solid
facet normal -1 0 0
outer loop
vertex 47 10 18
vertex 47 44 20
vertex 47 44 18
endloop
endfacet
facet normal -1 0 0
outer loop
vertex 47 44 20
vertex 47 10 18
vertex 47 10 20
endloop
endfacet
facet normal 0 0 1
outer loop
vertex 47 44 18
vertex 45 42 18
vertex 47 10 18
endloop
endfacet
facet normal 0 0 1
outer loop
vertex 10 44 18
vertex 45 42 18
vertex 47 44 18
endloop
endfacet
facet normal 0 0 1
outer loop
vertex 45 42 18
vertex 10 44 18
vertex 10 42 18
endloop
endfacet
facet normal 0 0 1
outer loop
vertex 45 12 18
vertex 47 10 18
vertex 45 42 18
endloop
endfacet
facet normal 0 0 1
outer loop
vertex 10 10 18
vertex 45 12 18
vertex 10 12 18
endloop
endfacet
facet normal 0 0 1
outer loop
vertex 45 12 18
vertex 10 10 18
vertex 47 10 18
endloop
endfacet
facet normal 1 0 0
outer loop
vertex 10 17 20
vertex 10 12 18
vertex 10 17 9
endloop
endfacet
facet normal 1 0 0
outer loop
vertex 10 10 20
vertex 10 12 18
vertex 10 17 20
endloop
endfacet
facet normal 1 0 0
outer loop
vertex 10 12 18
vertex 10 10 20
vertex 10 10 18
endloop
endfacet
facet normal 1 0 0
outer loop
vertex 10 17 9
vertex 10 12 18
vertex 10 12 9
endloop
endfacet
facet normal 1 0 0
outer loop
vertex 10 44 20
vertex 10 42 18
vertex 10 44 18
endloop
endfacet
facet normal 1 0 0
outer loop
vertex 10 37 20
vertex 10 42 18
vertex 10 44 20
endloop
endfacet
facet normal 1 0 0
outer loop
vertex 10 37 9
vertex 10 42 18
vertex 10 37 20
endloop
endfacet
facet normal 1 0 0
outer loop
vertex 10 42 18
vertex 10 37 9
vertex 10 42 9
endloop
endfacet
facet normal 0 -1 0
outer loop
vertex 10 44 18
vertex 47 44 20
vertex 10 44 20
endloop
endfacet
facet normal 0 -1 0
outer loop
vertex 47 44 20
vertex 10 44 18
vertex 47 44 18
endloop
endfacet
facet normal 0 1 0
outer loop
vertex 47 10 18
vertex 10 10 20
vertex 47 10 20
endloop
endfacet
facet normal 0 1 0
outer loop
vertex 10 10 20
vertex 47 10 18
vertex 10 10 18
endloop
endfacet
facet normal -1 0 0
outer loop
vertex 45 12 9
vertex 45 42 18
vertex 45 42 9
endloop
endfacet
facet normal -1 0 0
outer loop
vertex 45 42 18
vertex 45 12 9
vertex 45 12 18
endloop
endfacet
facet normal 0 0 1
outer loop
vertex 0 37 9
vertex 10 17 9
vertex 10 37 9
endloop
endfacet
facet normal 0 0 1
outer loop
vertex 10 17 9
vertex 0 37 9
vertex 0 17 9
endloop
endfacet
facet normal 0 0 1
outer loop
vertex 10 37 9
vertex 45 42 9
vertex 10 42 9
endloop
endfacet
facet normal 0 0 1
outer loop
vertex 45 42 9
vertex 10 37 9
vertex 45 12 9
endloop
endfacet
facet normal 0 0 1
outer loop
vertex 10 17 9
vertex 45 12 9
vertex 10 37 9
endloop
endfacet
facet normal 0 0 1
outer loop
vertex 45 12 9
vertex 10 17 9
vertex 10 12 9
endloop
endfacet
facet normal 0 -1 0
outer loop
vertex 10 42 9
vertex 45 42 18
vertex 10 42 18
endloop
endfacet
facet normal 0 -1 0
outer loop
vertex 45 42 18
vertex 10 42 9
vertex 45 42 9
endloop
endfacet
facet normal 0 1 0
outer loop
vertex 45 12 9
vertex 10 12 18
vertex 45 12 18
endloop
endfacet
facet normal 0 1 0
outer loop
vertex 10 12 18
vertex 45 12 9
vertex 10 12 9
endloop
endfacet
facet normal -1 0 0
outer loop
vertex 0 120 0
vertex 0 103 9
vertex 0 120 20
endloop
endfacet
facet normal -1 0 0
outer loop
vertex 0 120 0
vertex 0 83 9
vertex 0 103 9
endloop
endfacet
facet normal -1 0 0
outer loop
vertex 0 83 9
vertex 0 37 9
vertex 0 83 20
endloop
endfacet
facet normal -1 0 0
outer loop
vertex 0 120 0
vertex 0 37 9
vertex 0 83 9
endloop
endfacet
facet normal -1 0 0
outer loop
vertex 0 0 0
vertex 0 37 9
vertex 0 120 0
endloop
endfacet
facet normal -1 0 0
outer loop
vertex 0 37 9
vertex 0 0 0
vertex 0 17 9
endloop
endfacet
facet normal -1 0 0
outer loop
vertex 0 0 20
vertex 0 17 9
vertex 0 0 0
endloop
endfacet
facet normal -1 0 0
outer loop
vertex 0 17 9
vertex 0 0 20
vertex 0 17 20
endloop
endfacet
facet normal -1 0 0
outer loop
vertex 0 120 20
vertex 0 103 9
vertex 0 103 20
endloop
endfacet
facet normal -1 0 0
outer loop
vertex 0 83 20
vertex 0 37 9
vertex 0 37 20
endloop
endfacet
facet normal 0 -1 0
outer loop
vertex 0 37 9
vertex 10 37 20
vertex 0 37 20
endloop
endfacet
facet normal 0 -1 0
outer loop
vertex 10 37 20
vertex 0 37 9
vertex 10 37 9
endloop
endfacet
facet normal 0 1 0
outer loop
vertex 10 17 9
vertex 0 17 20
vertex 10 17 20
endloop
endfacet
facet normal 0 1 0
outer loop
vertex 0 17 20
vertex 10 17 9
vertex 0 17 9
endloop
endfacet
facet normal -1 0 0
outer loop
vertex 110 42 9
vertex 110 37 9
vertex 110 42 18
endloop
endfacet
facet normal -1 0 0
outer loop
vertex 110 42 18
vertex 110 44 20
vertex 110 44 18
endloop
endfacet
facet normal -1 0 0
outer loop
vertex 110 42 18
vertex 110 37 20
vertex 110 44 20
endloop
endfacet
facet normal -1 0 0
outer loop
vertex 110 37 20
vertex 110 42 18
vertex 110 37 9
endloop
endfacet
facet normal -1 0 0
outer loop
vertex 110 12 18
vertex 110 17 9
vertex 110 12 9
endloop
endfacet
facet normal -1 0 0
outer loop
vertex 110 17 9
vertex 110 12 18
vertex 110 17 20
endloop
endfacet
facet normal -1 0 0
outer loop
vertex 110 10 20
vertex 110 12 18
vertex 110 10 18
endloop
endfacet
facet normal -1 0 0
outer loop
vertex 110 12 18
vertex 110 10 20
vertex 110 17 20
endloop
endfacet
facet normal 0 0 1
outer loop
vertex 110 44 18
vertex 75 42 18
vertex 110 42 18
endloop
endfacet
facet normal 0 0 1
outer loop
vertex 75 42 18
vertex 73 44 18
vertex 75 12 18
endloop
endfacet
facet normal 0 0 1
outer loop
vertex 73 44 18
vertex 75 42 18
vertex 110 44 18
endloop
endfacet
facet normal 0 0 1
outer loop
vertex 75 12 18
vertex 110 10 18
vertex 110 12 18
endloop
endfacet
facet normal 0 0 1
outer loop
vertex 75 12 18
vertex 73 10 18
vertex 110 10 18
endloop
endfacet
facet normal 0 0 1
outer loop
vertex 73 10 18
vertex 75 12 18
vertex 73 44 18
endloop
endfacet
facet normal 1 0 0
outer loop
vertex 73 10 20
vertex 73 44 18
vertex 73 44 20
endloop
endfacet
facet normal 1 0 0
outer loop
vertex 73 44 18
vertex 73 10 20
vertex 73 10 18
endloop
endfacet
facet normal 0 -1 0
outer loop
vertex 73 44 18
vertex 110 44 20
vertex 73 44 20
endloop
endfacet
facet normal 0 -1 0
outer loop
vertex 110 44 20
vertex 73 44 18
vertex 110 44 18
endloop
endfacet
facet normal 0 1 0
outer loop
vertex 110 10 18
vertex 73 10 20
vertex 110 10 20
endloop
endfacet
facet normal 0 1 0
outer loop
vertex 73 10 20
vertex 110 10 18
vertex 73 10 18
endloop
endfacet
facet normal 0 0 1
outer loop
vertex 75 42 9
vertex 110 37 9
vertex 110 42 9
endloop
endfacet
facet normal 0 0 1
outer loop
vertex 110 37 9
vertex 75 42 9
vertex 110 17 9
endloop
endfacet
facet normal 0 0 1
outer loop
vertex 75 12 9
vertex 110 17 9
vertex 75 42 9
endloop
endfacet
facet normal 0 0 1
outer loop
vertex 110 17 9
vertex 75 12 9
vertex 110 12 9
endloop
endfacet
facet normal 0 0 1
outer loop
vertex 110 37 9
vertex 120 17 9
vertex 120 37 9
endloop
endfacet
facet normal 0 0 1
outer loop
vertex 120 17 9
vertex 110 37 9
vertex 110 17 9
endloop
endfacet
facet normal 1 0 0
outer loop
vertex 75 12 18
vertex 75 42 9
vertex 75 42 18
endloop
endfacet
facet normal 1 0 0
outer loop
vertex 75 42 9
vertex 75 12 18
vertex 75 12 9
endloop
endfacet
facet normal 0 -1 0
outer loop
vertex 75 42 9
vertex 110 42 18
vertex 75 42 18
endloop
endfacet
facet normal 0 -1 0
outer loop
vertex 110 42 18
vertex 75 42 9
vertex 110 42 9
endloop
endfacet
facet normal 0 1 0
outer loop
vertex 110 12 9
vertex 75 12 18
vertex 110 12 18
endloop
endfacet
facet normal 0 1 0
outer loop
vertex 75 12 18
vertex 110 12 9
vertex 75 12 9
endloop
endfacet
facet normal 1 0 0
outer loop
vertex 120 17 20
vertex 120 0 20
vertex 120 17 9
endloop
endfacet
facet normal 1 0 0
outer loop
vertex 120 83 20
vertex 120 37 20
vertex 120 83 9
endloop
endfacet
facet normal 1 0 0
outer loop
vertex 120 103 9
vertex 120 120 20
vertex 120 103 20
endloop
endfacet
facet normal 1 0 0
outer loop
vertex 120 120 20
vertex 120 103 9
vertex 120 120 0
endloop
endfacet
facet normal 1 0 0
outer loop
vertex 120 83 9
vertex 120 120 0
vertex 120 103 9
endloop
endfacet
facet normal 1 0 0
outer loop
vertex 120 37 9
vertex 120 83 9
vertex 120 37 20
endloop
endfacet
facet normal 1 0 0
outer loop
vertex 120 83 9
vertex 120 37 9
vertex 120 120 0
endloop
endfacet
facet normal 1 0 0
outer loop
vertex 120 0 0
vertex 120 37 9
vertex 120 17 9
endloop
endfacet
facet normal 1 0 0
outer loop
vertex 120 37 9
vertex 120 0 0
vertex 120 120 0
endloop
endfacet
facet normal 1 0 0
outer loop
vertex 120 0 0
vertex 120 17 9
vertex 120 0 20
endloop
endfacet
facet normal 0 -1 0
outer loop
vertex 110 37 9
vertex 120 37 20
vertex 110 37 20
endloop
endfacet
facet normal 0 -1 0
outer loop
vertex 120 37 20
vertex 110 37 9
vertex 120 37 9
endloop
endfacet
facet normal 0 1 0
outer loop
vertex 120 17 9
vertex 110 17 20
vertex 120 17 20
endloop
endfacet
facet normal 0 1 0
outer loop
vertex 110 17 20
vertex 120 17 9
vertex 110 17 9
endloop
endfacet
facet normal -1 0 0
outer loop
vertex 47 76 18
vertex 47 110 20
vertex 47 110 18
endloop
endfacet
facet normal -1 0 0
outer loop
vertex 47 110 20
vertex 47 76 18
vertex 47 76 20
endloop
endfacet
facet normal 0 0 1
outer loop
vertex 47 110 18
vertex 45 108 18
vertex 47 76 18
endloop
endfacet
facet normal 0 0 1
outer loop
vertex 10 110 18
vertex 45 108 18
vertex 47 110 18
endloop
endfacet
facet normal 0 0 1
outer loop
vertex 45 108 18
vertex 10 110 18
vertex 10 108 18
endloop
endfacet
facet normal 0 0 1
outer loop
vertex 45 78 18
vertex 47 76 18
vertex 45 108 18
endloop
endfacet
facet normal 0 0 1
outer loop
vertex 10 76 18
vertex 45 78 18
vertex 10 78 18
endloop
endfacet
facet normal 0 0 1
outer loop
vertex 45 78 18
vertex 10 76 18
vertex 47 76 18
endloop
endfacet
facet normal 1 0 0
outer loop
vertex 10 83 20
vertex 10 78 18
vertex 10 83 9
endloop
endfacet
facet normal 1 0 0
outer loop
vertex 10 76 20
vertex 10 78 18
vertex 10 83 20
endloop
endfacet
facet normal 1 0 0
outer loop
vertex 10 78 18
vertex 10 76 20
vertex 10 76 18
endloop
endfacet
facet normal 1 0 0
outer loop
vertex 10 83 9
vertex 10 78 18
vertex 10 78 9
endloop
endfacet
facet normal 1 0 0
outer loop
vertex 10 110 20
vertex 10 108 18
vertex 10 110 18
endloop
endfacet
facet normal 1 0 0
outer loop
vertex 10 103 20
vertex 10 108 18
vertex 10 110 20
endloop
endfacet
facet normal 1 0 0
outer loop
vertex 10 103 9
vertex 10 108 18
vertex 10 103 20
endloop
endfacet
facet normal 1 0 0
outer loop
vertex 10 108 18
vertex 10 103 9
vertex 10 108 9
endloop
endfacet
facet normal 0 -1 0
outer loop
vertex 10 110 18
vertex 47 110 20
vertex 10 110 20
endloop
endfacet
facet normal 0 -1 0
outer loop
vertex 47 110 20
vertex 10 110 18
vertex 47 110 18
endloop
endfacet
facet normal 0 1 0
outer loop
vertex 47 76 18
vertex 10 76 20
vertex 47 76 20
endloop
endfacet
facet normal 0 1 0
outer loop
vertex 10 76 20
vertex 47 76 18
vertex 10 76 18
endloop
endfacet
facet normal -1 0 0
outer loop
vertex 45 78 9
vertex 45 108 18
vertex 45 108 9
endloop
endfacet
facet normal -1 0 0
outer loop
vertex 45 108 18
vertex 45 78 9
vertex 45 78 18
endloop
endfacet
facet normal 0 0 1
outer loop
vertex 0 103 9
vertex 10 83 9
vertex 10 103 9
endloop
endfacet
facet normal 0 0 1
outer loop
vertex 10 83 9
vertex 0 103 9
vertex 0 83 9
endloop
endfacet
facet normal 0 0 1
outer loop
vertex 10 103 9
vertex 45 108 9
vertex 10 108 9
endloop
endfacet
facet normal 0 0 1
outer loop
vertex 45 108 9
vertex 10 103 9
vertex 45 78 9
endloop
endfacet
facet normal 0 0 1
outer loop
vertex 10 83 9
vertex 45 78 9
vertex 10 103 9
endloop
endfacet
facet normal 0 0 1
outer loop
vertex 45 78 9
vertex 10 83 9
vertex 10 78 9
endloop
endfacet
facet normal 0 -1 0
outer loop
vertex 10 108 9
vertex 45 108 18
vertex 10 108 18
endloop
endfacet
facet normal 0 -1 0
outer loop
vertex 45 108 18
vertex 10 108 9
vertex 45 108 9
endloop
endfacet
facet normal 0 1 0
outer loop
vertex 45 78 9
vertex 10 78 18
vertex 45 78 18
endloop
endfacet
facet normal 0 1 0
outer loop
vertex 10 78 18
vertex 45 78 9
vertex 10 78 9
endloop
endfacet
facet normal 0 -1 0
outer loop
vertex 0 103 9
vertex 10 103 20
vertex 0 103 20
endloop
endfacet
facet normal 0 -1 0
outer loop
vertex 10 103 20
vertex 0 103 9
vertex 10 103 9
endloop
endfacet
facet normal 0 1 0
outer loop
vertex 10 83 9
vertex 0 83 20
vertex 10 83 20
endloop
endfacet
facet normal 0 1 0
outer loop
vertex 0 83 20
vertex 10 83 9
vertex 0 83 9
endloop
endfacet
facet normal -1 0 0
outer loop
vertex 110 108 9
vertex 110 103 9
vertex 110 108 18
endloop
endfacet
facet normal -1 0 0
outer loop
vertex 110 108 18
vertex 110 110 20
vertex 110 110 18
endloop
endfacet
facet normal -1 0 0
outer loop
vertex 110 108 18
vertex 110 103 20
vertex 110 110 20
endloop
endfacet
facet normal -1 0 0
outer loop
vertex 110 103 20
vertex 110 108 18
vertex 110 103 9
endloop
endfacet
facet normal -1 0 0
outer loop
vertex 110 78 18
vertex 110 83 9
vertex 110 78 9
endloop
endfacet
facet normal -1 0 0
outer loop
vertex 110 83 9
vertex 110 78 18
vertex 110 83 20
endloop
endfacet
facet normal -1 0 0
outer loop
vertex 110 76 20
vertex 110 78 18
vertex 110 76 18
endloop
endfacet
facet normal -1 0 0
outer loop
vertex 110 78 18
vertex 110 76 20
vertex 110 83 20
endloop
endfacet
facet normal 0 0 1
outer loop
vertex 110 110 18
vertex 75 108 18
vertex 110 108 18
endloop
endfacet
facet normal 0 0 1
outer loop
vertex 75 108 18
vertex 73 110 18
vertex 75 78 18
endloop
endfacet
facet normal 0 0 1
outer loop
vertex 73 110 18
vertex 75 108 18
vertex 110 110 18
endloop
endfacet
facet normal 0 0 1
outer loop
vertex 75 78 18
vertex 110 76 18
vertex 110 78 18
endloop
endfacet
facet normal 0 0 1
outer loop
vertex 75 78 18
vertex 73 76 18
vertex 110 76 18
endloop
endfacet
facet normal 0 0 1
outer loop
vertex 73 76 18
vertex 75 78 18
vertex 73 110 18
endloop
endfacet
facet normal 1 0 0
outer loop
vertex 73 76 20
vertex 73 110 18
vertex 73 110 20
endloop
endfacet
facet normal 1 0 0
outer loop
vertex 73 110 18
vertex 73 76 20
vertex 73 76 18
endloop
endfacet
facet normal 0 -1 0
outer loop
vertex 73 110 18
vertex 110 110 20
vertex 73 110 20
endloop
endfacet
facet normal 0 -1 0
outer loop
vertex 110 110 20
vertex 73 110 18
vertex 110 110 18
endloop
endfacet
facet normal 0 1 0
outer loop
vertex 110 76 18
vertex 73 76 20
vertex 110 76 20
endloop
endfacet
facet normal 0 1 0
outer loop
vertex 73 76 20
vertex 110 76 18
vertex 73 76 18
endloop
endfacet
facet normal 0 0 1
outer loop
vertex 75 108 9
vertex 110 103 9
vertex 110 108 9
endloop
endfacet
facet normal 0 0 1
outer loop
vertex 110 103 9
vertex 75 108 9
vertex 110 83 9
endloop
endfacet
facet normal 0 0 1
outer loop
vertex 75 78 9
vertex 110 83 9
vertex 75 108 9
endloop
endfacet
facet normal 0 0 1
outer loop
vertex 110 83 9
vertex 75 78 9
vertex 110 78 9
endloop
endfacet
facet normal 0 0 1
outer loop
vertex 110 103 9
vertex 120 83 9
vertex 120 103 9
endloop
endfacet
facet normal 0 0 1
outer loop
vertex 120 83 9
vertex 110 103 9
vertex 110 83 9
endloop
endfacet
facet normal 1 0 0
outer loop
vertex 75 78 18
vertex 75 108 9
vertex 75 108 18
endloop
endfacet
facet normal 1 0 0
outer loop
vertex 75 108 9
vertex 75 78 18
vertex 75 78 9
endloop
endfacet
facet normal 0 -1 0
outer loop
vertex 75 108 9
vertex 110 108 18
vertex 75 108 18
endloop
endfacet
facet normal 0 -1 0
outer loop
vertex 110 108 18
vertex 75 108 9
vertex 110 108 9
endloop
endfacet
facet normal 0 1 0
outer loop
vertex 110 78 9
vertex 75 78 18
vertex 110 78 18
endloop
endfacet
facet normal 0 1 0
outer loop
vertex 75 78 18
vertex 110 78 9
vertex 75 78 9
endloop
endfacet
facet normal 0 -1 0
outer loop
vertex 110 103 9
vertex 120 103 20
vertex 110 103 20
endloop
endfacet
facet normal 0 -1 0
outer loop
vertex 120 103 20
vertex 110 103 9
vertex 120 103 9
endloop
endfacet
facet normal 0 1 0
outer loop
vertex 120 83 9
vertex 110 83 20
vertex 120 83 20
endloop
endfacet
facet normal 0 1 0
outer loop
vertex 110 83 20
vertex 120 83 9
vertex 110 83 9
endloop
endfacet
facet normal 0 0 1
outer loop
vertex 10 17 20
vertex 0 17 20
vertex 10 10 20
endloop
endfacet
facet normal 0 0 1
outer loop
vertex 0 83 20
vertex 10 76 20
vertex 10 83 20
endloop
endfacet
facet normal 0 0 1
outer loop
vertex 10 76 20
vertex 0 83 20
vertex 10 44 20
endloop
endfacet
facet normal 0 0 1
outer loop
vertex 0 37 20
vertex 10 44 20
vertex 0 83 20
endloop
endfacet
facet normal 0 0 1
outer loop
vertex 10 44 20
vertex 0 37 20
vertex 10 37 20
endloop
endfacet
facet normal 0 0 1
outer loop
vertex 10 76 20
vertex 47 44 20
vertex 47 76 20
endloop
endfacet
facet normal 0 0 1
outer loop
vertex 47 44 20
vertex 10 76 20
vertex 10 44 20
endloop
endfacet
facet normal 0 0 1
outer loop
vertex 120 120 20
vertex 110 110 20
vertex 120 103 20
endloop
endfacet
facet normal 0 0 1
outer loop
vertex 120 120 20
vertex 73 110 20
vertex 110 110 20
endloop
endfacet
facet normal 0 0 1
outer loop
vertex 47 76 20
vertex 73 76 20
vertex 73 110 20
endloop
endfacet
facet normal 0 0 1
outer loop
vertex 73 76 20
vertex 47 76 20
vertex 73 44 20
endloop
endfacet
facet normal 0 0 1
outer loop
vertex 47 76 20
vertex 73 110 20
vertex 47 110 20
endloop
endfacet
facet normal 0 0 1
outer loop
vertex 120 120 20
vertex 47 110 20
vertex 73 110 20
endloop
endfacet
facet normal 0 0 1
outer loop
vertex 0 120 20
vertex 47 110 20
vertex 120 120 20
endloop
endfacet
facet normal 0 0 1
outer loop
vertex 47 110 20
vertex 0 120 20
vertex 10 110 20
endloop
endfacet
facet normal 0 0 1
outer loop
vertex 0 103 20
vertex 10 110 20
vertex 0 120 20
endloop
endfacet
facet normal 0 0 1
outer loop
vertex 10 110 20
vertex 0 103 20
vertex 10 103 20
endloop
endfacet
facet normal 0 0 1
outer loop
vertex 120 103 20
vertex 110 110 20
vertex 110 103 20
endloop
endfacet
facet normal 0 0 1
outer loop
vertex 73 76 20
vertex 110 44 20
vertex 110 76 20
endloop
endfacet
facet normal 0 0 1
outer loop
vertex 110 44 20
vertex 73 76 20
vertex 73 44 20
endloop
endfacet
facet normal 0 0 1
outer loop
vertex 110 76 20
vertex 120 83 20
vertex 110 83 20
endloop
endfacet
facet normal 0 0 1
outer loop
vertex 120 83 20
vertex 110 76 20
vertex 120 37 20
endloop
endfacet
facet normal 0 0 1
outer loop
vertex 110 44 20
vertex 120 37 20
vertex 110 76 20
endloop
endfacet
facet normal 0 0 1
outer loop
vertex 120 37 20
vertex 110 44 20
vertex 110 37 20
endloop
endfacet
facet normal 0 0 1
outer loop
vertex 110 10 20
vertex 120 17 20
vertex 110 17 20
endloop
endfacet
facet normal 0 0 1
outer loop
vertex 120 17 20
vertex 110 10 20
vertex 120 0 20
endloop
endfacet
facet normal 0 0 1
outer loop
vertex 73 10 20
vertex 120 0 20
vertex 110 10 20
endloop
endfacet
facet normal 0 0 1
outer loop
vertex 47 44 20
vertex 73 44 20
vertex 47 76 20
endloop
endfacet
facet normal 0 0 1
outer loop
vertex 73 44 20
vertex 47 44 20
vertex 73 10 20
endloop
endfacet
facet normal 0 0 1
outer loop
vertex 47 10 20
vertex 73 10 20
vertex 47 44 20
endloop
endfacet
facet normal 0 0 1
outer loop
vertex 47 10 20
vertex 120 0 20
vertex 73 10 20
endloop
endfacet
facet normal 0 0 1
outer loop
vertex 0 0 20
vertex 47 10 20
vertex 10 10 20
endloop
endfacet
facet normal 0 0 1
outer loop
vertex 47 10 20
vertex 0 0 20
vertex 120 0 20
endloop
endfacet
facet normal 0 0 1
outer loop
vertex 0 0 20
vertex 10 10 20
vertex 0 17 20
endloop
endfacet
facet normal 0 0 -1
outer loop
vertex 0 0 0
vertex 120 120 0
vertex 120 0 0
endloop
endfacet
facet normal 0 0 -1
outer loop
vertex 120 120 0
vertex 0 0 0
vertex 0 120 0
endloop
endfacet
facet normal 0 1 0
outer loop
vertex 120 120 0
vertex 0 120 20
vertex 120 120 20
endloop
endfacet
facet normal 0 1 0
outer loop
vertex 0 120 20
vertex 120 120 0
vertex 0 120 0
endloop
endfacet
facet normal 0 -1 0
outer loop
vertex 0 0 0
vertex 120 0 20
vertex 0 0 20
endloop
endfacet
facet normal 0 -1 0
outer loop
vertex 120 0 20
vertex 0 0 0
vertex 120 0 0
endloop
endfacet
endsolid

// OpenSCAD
lado_base = 120;
altura_base = 20;

// rebaixo externo em cada canto
r1_x = 37;          // lado maior, paralelo ao eixo x
r1_y = 34;          // lado menor
r1_h = 2;           // profundidade

dist_borda = 10;    // distância às bordas externas

// rebaixo interno
margem_y = 2;       // 2 mm dos lados de 37 mm
margem_x_interna = 2; // 2 mm do lado de 34 mm mais distante da borda
margem_x_externa = 0; // 0 mm do lado de 34 mm mais próximo da borda
r2_h = 9;           // profundidade adicional abaixo do primeiro rebaixo

// abertura lateral quadrada
abertura_lado = 20;
abertura_h = 11;    // profundidade a partir do topo

eps = 0.01;

// dimensões do segundo rebaixo
r2_x = r1_x - margem_x_interna - margem_x_externa; // 35
r2_y = r1_y - 2*margem_y;                          // 30

module canto_rebaixado(x0, y0, lado_externo_esquerda=true) {

    // 1) rebaixo externo: 37 x 34 x 2
    translate([x0, y0, altura_base - r1_h])
        cube([r1_x, r1_y, r1_h + eps]);

    // 2) rebaixo interno: encostado no lado de 34 mm próximo da borda
    x2 = lado_externo_esquerda ? x0 : x0 + margem_x_interna;
    y2 = y0 + margem_y;

    translate([x2, y2, altura_base - (r1_h + r2_h)])
        cube([r2_x, r2_y, r2_h + eps]);

    // 3) abertura lateral quadrada 20 x 20, centrada no lado de 34 mm externo
    x_centro_abertura = lado_externo_esquerda ? x0 : x0 + r1_x;
    y_centro_abertura = y0 + r1_y/2;

    translate([
        x_centro_abertura - abertura_lado/2,
        y_centro_abertura - abertura_lado/2,
        altura_base - abertura_h
    ])
        cube([abertura_lado, abertura_lado, abertura_h + eps]);
}

difference() {
    // bloco base
    cube([lado_base, lado_base, altura_base]);

    // canto inferior esquerdo
    canto_rebaixado(dist_borda, dist_borda, true);

    // canto inferior direito
    canto_rebaixado(lado_base - dist_borda - r1_x, dist_borda, false);

    // canto superior esquerdo
    canto_rebaixado(dist_borda, lado_base - dist_borda - r1_y, true);

    // canto superior direito
    canto_rebaixado(lado_base - dist_borda - r1_x, lado_base - dist_borda - r1_y, false);
}
